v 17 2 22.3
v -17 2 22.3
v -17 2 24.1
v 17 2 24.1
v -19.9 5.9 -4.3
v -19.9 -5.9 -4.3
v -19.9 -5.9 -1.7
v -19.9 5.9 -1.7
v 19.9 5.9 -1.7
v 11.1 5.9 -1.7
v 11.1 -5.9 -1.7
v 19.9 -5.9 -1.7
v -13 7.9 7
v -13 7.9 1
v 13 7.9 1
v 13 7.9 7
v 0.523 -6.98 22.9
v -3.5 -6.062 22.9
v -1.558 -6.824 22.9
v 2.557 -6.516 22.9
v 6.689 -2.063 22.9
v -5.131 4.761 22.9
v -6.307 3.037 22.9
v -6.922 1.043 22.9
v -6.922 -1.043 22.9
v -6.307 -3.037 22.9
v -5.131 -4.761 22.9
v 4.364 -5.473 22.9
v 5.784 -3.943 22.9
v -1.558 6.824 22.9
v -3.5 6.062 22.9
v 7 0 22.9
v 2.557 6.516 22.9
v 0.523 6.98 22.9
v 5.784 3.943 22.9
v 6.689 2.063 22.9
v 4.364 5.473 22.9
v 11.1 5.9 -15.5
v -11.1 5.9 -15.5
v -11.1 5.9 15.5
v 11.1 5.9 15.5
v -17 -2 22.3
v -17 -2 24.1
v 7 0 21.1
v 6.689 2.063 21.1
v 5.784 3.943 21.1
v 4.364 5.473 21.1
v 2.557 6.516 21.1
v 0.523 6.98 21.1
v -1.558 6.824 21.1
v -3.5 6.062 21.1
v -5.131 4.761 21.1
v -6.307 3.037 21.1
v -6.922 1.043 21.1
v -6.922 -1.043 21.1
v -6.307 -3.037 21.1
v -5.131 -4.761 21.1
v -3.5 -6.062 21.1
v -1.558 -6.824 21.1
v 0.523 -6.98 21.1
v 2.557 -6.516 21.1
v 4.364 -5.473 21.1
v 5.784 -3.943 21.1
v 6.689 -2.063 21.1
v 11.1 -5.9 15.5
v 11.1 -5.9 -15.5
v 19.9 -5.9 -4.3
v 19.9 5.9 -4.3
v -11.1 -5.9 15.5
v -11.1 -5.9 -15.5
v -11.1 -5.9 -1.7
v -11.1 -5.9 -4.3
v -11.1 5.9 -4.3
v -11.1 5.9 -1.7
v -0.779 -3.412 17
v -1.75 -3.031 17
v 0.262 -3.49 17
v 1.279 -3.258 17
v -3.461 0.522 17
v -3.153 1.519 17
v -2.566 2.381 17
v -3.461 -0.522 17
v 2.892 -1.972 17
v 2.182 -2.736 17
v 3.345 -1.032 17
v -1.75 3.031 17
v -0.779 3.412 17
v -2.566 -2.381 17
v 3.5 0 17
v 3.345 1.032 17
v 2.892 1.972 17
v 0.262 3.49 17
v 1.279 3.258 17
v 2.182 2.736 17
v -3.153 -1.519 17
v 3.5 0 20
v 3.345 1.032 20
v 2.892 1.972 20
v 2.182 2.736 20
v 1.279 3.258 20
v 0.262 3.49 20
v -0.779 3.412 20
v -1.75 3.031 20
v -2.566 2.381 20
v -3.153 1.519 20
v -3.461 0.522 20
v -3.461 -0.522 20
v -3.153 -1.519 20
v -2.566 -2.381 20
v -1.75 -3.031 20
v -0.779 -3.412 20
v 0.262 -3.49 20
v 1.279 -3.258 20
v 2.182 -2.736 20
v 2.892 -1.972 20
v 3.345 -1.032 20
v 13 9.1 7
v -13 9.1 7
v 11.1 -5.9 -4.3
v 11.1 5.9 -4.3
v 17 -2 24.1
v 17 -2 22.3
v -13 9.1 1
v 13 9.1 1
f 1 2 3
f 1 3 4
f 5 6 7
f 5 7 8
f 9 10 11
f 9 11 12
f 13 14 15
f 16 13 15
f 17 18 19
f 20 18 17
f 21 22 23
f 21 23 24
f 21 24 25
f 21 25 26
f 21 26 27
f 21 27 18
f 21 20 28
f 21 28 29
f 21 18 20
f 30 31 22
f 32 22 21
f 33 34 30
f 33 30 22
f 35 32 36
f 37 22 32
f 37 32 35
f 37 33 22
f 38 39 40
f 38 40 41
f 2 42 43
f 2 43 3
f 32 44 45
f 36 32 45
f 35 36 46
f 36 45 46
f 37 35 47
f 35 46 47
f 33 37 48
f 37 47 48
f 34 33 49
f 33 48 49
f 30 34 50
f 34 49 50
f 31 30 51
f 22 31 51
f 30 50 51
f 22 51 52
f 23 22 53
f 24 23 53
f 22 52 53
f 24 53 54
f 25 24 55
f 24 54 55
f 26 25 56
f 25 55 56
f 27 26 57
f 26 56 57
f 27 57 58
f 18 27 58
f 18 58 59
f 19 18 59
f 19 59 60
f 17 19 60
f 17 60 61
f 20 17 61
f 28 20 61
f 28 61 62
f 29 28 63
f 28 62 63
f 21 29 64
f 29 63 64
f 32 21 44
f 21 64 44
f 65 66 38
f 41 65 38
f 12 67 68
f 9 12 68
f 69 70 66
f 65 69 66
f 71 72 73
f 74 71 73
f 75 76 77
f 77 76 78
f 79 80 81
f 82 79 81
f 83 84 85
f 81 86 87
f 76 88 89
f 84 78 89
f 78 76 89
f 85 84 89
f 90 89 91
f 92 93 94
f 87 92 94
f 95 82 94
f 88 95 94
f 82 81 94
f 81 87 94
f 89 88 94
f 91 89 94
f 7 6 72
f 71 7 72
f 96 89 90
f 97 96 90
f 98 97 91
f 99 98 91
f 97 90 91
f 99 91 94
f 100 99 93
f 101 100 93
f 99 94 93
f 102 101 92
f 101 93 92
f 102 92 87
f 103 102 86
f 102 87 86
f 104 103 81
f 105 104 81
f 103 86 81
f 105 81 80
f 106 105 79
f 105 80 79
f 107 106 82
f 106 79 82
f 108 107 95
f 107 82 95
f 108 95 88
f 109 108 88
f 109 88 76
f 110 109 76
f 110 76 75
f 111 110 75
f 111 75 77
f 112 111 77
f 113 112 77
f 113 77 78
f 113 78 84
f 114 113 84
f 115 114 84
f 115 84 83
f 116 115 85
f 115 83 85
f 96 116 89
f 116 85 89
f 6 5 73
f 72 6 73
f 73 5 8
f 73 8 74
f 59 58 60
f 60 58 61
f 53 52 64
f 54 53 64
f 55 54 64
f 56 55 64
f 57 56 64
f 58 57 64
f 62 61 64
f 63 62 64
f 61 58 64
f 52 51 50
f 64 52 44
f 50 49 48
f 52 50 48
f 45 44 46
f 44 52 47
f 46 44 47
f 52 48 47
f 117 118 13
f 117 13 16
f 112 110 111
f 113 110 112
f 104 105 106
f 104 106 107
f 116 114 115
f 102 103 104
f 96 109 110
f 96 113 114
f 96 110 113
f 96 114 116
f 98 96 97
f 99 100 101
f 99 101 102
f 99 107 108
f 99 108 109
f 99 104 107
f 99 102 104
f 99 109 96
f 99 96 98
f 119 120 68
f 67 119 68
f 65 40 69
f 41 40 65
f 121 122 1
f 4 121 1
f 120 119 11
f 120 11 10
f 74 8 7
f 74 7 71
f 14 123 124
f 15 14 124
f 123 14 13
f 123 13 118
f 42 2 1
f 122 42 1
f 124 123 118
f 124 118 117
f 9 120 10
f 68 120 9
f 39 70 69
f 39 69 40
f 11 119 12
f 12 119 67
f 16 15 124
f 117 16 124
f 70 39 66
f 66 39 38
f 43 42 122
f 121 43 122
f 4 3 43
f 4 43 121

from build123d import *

# Parameters (mm, degrees)
SG90_START                                 = -15.5
SKETCH_1_W                                 = 22.2
SKETCH_1_H                                 = 11.8
SG90_BODY_APPROX_22_2_X_11_8_X_31_MM_DEPTH = 31
SG90_START_2                               = -4.3
SKETCH_2_W                                 = 8.8
SKETCH_2_H                                 = 11.8
SG90_MOUNTING_EAR_LEFT_DEPTH               = 2.6
SKETCH_3_W                                 = 8.8
SKETCH_3_H                                 = 11.8
SG90_MOUNTING_EAR_RIGHT_DEPTH              = 2.6
SERVO_START                                = 17
SKETCH_4_R                                 = 3.5
SERVO_SPLINE_HUB_DEPTH                     = 3
SERVO_START_2                              = 21.1
SKETCH_5_R                                 = 7
SERVO_HORN_CENTER_DEPTH                    = 1.8
SERVO_START_3                              = 22.3
SKETCH_6_W                                 = 34
SKETCH_6_H                                 = 4
SERVO_HORN_ARM_DEPTH                       = 1.8
SERVO_START_4                              = 1
SKETCH_7_W                                 = 26
SKETCH_7_H                                 = 1.2
SERVO_LABEL_PLATE_SG90_DEPTH               = 6


with BuildPart() as part:
    # 草图1 → SG90 body - approx 22.2 x 11.8 x 31 mm (new body)
    with BuildSketch(Plane.XY.offset(SG90_START)):
        Rectangle(SKETCH_1_W, SKETCH_1_H)
    extrude(amount=SG90_BODY_APPROX_22_2_X_11_8_X_31_MM_DEPTH)


with BuildPart() as body_2:
    # 草图2 → SG90 mounting ear left (new body)
    with BuildSketch(Plane.XY.offset(SG90_START_2)):
        with Locations((-15.5, 0)):
            Rectangle(SKETCH_2_W, SKETCH_2_H)
    extrude(amount=SG90_MOUNTING_EAR_LEFT_DEPTH)


with BuildPart() as body_3:
    # 草图3 → SG90 mounting ear right (new body)
    with BuildSketch(Plane.XY.offset(SG90_START_2)):
        with Locations((15.5, 0)):
            Rectangle(SKETCH_3_W, SKETCH_3_H)
    extrude(amount=SG90_MOUNTING_EAR_RIGHT_DEPTH)


with BuildPart() as body_4:
    # 草图4 → servo spline hub (new body)
    with BuildSketch(Plane.XY.offset(SERVO_START)):
        Circle(SKETCH_4_R)
    extrude(amount=SERVO_SPLINE_HUB_DEPTH)


with BuildPart() as body_5:
    # 草图5 → servo horn center (new body)
    with BuildSketch(Plane.XY.offset(SERVO_START_2)):
        Circle(SKETCH_5_R)
    extrude(amount=SERVO_HORN_CENTER_DEPTH)


with BuildPart() as body_6:
    # 草图6 → servo horn arm (new body)
    with BuildSketch(Plane.XY.offset(SERVO_START_3)):
        Rectangle(SKETCH_6_W, SKETCH_6_H)
    extrude(amount=SERVO_HORN_ARM_DEPTH)


with BuildPart() as body_7:
    # 草图7 → servo label plate - SG90 (new body)
    with BuildSketch(Plane.XY.offset(SERVO_START_4)):
        with Locations((0, 8.5)):
            Rectangle(SKETCH_7_W, SKETCH_7_H)
    extrude(amount=SERVO_LABEL_PLATE_SG90_DEPTH)


solid = Compound([part.part, body_2.part, body_3.part, body_4.part, body_5.part, body_6.part, body_7.part])
